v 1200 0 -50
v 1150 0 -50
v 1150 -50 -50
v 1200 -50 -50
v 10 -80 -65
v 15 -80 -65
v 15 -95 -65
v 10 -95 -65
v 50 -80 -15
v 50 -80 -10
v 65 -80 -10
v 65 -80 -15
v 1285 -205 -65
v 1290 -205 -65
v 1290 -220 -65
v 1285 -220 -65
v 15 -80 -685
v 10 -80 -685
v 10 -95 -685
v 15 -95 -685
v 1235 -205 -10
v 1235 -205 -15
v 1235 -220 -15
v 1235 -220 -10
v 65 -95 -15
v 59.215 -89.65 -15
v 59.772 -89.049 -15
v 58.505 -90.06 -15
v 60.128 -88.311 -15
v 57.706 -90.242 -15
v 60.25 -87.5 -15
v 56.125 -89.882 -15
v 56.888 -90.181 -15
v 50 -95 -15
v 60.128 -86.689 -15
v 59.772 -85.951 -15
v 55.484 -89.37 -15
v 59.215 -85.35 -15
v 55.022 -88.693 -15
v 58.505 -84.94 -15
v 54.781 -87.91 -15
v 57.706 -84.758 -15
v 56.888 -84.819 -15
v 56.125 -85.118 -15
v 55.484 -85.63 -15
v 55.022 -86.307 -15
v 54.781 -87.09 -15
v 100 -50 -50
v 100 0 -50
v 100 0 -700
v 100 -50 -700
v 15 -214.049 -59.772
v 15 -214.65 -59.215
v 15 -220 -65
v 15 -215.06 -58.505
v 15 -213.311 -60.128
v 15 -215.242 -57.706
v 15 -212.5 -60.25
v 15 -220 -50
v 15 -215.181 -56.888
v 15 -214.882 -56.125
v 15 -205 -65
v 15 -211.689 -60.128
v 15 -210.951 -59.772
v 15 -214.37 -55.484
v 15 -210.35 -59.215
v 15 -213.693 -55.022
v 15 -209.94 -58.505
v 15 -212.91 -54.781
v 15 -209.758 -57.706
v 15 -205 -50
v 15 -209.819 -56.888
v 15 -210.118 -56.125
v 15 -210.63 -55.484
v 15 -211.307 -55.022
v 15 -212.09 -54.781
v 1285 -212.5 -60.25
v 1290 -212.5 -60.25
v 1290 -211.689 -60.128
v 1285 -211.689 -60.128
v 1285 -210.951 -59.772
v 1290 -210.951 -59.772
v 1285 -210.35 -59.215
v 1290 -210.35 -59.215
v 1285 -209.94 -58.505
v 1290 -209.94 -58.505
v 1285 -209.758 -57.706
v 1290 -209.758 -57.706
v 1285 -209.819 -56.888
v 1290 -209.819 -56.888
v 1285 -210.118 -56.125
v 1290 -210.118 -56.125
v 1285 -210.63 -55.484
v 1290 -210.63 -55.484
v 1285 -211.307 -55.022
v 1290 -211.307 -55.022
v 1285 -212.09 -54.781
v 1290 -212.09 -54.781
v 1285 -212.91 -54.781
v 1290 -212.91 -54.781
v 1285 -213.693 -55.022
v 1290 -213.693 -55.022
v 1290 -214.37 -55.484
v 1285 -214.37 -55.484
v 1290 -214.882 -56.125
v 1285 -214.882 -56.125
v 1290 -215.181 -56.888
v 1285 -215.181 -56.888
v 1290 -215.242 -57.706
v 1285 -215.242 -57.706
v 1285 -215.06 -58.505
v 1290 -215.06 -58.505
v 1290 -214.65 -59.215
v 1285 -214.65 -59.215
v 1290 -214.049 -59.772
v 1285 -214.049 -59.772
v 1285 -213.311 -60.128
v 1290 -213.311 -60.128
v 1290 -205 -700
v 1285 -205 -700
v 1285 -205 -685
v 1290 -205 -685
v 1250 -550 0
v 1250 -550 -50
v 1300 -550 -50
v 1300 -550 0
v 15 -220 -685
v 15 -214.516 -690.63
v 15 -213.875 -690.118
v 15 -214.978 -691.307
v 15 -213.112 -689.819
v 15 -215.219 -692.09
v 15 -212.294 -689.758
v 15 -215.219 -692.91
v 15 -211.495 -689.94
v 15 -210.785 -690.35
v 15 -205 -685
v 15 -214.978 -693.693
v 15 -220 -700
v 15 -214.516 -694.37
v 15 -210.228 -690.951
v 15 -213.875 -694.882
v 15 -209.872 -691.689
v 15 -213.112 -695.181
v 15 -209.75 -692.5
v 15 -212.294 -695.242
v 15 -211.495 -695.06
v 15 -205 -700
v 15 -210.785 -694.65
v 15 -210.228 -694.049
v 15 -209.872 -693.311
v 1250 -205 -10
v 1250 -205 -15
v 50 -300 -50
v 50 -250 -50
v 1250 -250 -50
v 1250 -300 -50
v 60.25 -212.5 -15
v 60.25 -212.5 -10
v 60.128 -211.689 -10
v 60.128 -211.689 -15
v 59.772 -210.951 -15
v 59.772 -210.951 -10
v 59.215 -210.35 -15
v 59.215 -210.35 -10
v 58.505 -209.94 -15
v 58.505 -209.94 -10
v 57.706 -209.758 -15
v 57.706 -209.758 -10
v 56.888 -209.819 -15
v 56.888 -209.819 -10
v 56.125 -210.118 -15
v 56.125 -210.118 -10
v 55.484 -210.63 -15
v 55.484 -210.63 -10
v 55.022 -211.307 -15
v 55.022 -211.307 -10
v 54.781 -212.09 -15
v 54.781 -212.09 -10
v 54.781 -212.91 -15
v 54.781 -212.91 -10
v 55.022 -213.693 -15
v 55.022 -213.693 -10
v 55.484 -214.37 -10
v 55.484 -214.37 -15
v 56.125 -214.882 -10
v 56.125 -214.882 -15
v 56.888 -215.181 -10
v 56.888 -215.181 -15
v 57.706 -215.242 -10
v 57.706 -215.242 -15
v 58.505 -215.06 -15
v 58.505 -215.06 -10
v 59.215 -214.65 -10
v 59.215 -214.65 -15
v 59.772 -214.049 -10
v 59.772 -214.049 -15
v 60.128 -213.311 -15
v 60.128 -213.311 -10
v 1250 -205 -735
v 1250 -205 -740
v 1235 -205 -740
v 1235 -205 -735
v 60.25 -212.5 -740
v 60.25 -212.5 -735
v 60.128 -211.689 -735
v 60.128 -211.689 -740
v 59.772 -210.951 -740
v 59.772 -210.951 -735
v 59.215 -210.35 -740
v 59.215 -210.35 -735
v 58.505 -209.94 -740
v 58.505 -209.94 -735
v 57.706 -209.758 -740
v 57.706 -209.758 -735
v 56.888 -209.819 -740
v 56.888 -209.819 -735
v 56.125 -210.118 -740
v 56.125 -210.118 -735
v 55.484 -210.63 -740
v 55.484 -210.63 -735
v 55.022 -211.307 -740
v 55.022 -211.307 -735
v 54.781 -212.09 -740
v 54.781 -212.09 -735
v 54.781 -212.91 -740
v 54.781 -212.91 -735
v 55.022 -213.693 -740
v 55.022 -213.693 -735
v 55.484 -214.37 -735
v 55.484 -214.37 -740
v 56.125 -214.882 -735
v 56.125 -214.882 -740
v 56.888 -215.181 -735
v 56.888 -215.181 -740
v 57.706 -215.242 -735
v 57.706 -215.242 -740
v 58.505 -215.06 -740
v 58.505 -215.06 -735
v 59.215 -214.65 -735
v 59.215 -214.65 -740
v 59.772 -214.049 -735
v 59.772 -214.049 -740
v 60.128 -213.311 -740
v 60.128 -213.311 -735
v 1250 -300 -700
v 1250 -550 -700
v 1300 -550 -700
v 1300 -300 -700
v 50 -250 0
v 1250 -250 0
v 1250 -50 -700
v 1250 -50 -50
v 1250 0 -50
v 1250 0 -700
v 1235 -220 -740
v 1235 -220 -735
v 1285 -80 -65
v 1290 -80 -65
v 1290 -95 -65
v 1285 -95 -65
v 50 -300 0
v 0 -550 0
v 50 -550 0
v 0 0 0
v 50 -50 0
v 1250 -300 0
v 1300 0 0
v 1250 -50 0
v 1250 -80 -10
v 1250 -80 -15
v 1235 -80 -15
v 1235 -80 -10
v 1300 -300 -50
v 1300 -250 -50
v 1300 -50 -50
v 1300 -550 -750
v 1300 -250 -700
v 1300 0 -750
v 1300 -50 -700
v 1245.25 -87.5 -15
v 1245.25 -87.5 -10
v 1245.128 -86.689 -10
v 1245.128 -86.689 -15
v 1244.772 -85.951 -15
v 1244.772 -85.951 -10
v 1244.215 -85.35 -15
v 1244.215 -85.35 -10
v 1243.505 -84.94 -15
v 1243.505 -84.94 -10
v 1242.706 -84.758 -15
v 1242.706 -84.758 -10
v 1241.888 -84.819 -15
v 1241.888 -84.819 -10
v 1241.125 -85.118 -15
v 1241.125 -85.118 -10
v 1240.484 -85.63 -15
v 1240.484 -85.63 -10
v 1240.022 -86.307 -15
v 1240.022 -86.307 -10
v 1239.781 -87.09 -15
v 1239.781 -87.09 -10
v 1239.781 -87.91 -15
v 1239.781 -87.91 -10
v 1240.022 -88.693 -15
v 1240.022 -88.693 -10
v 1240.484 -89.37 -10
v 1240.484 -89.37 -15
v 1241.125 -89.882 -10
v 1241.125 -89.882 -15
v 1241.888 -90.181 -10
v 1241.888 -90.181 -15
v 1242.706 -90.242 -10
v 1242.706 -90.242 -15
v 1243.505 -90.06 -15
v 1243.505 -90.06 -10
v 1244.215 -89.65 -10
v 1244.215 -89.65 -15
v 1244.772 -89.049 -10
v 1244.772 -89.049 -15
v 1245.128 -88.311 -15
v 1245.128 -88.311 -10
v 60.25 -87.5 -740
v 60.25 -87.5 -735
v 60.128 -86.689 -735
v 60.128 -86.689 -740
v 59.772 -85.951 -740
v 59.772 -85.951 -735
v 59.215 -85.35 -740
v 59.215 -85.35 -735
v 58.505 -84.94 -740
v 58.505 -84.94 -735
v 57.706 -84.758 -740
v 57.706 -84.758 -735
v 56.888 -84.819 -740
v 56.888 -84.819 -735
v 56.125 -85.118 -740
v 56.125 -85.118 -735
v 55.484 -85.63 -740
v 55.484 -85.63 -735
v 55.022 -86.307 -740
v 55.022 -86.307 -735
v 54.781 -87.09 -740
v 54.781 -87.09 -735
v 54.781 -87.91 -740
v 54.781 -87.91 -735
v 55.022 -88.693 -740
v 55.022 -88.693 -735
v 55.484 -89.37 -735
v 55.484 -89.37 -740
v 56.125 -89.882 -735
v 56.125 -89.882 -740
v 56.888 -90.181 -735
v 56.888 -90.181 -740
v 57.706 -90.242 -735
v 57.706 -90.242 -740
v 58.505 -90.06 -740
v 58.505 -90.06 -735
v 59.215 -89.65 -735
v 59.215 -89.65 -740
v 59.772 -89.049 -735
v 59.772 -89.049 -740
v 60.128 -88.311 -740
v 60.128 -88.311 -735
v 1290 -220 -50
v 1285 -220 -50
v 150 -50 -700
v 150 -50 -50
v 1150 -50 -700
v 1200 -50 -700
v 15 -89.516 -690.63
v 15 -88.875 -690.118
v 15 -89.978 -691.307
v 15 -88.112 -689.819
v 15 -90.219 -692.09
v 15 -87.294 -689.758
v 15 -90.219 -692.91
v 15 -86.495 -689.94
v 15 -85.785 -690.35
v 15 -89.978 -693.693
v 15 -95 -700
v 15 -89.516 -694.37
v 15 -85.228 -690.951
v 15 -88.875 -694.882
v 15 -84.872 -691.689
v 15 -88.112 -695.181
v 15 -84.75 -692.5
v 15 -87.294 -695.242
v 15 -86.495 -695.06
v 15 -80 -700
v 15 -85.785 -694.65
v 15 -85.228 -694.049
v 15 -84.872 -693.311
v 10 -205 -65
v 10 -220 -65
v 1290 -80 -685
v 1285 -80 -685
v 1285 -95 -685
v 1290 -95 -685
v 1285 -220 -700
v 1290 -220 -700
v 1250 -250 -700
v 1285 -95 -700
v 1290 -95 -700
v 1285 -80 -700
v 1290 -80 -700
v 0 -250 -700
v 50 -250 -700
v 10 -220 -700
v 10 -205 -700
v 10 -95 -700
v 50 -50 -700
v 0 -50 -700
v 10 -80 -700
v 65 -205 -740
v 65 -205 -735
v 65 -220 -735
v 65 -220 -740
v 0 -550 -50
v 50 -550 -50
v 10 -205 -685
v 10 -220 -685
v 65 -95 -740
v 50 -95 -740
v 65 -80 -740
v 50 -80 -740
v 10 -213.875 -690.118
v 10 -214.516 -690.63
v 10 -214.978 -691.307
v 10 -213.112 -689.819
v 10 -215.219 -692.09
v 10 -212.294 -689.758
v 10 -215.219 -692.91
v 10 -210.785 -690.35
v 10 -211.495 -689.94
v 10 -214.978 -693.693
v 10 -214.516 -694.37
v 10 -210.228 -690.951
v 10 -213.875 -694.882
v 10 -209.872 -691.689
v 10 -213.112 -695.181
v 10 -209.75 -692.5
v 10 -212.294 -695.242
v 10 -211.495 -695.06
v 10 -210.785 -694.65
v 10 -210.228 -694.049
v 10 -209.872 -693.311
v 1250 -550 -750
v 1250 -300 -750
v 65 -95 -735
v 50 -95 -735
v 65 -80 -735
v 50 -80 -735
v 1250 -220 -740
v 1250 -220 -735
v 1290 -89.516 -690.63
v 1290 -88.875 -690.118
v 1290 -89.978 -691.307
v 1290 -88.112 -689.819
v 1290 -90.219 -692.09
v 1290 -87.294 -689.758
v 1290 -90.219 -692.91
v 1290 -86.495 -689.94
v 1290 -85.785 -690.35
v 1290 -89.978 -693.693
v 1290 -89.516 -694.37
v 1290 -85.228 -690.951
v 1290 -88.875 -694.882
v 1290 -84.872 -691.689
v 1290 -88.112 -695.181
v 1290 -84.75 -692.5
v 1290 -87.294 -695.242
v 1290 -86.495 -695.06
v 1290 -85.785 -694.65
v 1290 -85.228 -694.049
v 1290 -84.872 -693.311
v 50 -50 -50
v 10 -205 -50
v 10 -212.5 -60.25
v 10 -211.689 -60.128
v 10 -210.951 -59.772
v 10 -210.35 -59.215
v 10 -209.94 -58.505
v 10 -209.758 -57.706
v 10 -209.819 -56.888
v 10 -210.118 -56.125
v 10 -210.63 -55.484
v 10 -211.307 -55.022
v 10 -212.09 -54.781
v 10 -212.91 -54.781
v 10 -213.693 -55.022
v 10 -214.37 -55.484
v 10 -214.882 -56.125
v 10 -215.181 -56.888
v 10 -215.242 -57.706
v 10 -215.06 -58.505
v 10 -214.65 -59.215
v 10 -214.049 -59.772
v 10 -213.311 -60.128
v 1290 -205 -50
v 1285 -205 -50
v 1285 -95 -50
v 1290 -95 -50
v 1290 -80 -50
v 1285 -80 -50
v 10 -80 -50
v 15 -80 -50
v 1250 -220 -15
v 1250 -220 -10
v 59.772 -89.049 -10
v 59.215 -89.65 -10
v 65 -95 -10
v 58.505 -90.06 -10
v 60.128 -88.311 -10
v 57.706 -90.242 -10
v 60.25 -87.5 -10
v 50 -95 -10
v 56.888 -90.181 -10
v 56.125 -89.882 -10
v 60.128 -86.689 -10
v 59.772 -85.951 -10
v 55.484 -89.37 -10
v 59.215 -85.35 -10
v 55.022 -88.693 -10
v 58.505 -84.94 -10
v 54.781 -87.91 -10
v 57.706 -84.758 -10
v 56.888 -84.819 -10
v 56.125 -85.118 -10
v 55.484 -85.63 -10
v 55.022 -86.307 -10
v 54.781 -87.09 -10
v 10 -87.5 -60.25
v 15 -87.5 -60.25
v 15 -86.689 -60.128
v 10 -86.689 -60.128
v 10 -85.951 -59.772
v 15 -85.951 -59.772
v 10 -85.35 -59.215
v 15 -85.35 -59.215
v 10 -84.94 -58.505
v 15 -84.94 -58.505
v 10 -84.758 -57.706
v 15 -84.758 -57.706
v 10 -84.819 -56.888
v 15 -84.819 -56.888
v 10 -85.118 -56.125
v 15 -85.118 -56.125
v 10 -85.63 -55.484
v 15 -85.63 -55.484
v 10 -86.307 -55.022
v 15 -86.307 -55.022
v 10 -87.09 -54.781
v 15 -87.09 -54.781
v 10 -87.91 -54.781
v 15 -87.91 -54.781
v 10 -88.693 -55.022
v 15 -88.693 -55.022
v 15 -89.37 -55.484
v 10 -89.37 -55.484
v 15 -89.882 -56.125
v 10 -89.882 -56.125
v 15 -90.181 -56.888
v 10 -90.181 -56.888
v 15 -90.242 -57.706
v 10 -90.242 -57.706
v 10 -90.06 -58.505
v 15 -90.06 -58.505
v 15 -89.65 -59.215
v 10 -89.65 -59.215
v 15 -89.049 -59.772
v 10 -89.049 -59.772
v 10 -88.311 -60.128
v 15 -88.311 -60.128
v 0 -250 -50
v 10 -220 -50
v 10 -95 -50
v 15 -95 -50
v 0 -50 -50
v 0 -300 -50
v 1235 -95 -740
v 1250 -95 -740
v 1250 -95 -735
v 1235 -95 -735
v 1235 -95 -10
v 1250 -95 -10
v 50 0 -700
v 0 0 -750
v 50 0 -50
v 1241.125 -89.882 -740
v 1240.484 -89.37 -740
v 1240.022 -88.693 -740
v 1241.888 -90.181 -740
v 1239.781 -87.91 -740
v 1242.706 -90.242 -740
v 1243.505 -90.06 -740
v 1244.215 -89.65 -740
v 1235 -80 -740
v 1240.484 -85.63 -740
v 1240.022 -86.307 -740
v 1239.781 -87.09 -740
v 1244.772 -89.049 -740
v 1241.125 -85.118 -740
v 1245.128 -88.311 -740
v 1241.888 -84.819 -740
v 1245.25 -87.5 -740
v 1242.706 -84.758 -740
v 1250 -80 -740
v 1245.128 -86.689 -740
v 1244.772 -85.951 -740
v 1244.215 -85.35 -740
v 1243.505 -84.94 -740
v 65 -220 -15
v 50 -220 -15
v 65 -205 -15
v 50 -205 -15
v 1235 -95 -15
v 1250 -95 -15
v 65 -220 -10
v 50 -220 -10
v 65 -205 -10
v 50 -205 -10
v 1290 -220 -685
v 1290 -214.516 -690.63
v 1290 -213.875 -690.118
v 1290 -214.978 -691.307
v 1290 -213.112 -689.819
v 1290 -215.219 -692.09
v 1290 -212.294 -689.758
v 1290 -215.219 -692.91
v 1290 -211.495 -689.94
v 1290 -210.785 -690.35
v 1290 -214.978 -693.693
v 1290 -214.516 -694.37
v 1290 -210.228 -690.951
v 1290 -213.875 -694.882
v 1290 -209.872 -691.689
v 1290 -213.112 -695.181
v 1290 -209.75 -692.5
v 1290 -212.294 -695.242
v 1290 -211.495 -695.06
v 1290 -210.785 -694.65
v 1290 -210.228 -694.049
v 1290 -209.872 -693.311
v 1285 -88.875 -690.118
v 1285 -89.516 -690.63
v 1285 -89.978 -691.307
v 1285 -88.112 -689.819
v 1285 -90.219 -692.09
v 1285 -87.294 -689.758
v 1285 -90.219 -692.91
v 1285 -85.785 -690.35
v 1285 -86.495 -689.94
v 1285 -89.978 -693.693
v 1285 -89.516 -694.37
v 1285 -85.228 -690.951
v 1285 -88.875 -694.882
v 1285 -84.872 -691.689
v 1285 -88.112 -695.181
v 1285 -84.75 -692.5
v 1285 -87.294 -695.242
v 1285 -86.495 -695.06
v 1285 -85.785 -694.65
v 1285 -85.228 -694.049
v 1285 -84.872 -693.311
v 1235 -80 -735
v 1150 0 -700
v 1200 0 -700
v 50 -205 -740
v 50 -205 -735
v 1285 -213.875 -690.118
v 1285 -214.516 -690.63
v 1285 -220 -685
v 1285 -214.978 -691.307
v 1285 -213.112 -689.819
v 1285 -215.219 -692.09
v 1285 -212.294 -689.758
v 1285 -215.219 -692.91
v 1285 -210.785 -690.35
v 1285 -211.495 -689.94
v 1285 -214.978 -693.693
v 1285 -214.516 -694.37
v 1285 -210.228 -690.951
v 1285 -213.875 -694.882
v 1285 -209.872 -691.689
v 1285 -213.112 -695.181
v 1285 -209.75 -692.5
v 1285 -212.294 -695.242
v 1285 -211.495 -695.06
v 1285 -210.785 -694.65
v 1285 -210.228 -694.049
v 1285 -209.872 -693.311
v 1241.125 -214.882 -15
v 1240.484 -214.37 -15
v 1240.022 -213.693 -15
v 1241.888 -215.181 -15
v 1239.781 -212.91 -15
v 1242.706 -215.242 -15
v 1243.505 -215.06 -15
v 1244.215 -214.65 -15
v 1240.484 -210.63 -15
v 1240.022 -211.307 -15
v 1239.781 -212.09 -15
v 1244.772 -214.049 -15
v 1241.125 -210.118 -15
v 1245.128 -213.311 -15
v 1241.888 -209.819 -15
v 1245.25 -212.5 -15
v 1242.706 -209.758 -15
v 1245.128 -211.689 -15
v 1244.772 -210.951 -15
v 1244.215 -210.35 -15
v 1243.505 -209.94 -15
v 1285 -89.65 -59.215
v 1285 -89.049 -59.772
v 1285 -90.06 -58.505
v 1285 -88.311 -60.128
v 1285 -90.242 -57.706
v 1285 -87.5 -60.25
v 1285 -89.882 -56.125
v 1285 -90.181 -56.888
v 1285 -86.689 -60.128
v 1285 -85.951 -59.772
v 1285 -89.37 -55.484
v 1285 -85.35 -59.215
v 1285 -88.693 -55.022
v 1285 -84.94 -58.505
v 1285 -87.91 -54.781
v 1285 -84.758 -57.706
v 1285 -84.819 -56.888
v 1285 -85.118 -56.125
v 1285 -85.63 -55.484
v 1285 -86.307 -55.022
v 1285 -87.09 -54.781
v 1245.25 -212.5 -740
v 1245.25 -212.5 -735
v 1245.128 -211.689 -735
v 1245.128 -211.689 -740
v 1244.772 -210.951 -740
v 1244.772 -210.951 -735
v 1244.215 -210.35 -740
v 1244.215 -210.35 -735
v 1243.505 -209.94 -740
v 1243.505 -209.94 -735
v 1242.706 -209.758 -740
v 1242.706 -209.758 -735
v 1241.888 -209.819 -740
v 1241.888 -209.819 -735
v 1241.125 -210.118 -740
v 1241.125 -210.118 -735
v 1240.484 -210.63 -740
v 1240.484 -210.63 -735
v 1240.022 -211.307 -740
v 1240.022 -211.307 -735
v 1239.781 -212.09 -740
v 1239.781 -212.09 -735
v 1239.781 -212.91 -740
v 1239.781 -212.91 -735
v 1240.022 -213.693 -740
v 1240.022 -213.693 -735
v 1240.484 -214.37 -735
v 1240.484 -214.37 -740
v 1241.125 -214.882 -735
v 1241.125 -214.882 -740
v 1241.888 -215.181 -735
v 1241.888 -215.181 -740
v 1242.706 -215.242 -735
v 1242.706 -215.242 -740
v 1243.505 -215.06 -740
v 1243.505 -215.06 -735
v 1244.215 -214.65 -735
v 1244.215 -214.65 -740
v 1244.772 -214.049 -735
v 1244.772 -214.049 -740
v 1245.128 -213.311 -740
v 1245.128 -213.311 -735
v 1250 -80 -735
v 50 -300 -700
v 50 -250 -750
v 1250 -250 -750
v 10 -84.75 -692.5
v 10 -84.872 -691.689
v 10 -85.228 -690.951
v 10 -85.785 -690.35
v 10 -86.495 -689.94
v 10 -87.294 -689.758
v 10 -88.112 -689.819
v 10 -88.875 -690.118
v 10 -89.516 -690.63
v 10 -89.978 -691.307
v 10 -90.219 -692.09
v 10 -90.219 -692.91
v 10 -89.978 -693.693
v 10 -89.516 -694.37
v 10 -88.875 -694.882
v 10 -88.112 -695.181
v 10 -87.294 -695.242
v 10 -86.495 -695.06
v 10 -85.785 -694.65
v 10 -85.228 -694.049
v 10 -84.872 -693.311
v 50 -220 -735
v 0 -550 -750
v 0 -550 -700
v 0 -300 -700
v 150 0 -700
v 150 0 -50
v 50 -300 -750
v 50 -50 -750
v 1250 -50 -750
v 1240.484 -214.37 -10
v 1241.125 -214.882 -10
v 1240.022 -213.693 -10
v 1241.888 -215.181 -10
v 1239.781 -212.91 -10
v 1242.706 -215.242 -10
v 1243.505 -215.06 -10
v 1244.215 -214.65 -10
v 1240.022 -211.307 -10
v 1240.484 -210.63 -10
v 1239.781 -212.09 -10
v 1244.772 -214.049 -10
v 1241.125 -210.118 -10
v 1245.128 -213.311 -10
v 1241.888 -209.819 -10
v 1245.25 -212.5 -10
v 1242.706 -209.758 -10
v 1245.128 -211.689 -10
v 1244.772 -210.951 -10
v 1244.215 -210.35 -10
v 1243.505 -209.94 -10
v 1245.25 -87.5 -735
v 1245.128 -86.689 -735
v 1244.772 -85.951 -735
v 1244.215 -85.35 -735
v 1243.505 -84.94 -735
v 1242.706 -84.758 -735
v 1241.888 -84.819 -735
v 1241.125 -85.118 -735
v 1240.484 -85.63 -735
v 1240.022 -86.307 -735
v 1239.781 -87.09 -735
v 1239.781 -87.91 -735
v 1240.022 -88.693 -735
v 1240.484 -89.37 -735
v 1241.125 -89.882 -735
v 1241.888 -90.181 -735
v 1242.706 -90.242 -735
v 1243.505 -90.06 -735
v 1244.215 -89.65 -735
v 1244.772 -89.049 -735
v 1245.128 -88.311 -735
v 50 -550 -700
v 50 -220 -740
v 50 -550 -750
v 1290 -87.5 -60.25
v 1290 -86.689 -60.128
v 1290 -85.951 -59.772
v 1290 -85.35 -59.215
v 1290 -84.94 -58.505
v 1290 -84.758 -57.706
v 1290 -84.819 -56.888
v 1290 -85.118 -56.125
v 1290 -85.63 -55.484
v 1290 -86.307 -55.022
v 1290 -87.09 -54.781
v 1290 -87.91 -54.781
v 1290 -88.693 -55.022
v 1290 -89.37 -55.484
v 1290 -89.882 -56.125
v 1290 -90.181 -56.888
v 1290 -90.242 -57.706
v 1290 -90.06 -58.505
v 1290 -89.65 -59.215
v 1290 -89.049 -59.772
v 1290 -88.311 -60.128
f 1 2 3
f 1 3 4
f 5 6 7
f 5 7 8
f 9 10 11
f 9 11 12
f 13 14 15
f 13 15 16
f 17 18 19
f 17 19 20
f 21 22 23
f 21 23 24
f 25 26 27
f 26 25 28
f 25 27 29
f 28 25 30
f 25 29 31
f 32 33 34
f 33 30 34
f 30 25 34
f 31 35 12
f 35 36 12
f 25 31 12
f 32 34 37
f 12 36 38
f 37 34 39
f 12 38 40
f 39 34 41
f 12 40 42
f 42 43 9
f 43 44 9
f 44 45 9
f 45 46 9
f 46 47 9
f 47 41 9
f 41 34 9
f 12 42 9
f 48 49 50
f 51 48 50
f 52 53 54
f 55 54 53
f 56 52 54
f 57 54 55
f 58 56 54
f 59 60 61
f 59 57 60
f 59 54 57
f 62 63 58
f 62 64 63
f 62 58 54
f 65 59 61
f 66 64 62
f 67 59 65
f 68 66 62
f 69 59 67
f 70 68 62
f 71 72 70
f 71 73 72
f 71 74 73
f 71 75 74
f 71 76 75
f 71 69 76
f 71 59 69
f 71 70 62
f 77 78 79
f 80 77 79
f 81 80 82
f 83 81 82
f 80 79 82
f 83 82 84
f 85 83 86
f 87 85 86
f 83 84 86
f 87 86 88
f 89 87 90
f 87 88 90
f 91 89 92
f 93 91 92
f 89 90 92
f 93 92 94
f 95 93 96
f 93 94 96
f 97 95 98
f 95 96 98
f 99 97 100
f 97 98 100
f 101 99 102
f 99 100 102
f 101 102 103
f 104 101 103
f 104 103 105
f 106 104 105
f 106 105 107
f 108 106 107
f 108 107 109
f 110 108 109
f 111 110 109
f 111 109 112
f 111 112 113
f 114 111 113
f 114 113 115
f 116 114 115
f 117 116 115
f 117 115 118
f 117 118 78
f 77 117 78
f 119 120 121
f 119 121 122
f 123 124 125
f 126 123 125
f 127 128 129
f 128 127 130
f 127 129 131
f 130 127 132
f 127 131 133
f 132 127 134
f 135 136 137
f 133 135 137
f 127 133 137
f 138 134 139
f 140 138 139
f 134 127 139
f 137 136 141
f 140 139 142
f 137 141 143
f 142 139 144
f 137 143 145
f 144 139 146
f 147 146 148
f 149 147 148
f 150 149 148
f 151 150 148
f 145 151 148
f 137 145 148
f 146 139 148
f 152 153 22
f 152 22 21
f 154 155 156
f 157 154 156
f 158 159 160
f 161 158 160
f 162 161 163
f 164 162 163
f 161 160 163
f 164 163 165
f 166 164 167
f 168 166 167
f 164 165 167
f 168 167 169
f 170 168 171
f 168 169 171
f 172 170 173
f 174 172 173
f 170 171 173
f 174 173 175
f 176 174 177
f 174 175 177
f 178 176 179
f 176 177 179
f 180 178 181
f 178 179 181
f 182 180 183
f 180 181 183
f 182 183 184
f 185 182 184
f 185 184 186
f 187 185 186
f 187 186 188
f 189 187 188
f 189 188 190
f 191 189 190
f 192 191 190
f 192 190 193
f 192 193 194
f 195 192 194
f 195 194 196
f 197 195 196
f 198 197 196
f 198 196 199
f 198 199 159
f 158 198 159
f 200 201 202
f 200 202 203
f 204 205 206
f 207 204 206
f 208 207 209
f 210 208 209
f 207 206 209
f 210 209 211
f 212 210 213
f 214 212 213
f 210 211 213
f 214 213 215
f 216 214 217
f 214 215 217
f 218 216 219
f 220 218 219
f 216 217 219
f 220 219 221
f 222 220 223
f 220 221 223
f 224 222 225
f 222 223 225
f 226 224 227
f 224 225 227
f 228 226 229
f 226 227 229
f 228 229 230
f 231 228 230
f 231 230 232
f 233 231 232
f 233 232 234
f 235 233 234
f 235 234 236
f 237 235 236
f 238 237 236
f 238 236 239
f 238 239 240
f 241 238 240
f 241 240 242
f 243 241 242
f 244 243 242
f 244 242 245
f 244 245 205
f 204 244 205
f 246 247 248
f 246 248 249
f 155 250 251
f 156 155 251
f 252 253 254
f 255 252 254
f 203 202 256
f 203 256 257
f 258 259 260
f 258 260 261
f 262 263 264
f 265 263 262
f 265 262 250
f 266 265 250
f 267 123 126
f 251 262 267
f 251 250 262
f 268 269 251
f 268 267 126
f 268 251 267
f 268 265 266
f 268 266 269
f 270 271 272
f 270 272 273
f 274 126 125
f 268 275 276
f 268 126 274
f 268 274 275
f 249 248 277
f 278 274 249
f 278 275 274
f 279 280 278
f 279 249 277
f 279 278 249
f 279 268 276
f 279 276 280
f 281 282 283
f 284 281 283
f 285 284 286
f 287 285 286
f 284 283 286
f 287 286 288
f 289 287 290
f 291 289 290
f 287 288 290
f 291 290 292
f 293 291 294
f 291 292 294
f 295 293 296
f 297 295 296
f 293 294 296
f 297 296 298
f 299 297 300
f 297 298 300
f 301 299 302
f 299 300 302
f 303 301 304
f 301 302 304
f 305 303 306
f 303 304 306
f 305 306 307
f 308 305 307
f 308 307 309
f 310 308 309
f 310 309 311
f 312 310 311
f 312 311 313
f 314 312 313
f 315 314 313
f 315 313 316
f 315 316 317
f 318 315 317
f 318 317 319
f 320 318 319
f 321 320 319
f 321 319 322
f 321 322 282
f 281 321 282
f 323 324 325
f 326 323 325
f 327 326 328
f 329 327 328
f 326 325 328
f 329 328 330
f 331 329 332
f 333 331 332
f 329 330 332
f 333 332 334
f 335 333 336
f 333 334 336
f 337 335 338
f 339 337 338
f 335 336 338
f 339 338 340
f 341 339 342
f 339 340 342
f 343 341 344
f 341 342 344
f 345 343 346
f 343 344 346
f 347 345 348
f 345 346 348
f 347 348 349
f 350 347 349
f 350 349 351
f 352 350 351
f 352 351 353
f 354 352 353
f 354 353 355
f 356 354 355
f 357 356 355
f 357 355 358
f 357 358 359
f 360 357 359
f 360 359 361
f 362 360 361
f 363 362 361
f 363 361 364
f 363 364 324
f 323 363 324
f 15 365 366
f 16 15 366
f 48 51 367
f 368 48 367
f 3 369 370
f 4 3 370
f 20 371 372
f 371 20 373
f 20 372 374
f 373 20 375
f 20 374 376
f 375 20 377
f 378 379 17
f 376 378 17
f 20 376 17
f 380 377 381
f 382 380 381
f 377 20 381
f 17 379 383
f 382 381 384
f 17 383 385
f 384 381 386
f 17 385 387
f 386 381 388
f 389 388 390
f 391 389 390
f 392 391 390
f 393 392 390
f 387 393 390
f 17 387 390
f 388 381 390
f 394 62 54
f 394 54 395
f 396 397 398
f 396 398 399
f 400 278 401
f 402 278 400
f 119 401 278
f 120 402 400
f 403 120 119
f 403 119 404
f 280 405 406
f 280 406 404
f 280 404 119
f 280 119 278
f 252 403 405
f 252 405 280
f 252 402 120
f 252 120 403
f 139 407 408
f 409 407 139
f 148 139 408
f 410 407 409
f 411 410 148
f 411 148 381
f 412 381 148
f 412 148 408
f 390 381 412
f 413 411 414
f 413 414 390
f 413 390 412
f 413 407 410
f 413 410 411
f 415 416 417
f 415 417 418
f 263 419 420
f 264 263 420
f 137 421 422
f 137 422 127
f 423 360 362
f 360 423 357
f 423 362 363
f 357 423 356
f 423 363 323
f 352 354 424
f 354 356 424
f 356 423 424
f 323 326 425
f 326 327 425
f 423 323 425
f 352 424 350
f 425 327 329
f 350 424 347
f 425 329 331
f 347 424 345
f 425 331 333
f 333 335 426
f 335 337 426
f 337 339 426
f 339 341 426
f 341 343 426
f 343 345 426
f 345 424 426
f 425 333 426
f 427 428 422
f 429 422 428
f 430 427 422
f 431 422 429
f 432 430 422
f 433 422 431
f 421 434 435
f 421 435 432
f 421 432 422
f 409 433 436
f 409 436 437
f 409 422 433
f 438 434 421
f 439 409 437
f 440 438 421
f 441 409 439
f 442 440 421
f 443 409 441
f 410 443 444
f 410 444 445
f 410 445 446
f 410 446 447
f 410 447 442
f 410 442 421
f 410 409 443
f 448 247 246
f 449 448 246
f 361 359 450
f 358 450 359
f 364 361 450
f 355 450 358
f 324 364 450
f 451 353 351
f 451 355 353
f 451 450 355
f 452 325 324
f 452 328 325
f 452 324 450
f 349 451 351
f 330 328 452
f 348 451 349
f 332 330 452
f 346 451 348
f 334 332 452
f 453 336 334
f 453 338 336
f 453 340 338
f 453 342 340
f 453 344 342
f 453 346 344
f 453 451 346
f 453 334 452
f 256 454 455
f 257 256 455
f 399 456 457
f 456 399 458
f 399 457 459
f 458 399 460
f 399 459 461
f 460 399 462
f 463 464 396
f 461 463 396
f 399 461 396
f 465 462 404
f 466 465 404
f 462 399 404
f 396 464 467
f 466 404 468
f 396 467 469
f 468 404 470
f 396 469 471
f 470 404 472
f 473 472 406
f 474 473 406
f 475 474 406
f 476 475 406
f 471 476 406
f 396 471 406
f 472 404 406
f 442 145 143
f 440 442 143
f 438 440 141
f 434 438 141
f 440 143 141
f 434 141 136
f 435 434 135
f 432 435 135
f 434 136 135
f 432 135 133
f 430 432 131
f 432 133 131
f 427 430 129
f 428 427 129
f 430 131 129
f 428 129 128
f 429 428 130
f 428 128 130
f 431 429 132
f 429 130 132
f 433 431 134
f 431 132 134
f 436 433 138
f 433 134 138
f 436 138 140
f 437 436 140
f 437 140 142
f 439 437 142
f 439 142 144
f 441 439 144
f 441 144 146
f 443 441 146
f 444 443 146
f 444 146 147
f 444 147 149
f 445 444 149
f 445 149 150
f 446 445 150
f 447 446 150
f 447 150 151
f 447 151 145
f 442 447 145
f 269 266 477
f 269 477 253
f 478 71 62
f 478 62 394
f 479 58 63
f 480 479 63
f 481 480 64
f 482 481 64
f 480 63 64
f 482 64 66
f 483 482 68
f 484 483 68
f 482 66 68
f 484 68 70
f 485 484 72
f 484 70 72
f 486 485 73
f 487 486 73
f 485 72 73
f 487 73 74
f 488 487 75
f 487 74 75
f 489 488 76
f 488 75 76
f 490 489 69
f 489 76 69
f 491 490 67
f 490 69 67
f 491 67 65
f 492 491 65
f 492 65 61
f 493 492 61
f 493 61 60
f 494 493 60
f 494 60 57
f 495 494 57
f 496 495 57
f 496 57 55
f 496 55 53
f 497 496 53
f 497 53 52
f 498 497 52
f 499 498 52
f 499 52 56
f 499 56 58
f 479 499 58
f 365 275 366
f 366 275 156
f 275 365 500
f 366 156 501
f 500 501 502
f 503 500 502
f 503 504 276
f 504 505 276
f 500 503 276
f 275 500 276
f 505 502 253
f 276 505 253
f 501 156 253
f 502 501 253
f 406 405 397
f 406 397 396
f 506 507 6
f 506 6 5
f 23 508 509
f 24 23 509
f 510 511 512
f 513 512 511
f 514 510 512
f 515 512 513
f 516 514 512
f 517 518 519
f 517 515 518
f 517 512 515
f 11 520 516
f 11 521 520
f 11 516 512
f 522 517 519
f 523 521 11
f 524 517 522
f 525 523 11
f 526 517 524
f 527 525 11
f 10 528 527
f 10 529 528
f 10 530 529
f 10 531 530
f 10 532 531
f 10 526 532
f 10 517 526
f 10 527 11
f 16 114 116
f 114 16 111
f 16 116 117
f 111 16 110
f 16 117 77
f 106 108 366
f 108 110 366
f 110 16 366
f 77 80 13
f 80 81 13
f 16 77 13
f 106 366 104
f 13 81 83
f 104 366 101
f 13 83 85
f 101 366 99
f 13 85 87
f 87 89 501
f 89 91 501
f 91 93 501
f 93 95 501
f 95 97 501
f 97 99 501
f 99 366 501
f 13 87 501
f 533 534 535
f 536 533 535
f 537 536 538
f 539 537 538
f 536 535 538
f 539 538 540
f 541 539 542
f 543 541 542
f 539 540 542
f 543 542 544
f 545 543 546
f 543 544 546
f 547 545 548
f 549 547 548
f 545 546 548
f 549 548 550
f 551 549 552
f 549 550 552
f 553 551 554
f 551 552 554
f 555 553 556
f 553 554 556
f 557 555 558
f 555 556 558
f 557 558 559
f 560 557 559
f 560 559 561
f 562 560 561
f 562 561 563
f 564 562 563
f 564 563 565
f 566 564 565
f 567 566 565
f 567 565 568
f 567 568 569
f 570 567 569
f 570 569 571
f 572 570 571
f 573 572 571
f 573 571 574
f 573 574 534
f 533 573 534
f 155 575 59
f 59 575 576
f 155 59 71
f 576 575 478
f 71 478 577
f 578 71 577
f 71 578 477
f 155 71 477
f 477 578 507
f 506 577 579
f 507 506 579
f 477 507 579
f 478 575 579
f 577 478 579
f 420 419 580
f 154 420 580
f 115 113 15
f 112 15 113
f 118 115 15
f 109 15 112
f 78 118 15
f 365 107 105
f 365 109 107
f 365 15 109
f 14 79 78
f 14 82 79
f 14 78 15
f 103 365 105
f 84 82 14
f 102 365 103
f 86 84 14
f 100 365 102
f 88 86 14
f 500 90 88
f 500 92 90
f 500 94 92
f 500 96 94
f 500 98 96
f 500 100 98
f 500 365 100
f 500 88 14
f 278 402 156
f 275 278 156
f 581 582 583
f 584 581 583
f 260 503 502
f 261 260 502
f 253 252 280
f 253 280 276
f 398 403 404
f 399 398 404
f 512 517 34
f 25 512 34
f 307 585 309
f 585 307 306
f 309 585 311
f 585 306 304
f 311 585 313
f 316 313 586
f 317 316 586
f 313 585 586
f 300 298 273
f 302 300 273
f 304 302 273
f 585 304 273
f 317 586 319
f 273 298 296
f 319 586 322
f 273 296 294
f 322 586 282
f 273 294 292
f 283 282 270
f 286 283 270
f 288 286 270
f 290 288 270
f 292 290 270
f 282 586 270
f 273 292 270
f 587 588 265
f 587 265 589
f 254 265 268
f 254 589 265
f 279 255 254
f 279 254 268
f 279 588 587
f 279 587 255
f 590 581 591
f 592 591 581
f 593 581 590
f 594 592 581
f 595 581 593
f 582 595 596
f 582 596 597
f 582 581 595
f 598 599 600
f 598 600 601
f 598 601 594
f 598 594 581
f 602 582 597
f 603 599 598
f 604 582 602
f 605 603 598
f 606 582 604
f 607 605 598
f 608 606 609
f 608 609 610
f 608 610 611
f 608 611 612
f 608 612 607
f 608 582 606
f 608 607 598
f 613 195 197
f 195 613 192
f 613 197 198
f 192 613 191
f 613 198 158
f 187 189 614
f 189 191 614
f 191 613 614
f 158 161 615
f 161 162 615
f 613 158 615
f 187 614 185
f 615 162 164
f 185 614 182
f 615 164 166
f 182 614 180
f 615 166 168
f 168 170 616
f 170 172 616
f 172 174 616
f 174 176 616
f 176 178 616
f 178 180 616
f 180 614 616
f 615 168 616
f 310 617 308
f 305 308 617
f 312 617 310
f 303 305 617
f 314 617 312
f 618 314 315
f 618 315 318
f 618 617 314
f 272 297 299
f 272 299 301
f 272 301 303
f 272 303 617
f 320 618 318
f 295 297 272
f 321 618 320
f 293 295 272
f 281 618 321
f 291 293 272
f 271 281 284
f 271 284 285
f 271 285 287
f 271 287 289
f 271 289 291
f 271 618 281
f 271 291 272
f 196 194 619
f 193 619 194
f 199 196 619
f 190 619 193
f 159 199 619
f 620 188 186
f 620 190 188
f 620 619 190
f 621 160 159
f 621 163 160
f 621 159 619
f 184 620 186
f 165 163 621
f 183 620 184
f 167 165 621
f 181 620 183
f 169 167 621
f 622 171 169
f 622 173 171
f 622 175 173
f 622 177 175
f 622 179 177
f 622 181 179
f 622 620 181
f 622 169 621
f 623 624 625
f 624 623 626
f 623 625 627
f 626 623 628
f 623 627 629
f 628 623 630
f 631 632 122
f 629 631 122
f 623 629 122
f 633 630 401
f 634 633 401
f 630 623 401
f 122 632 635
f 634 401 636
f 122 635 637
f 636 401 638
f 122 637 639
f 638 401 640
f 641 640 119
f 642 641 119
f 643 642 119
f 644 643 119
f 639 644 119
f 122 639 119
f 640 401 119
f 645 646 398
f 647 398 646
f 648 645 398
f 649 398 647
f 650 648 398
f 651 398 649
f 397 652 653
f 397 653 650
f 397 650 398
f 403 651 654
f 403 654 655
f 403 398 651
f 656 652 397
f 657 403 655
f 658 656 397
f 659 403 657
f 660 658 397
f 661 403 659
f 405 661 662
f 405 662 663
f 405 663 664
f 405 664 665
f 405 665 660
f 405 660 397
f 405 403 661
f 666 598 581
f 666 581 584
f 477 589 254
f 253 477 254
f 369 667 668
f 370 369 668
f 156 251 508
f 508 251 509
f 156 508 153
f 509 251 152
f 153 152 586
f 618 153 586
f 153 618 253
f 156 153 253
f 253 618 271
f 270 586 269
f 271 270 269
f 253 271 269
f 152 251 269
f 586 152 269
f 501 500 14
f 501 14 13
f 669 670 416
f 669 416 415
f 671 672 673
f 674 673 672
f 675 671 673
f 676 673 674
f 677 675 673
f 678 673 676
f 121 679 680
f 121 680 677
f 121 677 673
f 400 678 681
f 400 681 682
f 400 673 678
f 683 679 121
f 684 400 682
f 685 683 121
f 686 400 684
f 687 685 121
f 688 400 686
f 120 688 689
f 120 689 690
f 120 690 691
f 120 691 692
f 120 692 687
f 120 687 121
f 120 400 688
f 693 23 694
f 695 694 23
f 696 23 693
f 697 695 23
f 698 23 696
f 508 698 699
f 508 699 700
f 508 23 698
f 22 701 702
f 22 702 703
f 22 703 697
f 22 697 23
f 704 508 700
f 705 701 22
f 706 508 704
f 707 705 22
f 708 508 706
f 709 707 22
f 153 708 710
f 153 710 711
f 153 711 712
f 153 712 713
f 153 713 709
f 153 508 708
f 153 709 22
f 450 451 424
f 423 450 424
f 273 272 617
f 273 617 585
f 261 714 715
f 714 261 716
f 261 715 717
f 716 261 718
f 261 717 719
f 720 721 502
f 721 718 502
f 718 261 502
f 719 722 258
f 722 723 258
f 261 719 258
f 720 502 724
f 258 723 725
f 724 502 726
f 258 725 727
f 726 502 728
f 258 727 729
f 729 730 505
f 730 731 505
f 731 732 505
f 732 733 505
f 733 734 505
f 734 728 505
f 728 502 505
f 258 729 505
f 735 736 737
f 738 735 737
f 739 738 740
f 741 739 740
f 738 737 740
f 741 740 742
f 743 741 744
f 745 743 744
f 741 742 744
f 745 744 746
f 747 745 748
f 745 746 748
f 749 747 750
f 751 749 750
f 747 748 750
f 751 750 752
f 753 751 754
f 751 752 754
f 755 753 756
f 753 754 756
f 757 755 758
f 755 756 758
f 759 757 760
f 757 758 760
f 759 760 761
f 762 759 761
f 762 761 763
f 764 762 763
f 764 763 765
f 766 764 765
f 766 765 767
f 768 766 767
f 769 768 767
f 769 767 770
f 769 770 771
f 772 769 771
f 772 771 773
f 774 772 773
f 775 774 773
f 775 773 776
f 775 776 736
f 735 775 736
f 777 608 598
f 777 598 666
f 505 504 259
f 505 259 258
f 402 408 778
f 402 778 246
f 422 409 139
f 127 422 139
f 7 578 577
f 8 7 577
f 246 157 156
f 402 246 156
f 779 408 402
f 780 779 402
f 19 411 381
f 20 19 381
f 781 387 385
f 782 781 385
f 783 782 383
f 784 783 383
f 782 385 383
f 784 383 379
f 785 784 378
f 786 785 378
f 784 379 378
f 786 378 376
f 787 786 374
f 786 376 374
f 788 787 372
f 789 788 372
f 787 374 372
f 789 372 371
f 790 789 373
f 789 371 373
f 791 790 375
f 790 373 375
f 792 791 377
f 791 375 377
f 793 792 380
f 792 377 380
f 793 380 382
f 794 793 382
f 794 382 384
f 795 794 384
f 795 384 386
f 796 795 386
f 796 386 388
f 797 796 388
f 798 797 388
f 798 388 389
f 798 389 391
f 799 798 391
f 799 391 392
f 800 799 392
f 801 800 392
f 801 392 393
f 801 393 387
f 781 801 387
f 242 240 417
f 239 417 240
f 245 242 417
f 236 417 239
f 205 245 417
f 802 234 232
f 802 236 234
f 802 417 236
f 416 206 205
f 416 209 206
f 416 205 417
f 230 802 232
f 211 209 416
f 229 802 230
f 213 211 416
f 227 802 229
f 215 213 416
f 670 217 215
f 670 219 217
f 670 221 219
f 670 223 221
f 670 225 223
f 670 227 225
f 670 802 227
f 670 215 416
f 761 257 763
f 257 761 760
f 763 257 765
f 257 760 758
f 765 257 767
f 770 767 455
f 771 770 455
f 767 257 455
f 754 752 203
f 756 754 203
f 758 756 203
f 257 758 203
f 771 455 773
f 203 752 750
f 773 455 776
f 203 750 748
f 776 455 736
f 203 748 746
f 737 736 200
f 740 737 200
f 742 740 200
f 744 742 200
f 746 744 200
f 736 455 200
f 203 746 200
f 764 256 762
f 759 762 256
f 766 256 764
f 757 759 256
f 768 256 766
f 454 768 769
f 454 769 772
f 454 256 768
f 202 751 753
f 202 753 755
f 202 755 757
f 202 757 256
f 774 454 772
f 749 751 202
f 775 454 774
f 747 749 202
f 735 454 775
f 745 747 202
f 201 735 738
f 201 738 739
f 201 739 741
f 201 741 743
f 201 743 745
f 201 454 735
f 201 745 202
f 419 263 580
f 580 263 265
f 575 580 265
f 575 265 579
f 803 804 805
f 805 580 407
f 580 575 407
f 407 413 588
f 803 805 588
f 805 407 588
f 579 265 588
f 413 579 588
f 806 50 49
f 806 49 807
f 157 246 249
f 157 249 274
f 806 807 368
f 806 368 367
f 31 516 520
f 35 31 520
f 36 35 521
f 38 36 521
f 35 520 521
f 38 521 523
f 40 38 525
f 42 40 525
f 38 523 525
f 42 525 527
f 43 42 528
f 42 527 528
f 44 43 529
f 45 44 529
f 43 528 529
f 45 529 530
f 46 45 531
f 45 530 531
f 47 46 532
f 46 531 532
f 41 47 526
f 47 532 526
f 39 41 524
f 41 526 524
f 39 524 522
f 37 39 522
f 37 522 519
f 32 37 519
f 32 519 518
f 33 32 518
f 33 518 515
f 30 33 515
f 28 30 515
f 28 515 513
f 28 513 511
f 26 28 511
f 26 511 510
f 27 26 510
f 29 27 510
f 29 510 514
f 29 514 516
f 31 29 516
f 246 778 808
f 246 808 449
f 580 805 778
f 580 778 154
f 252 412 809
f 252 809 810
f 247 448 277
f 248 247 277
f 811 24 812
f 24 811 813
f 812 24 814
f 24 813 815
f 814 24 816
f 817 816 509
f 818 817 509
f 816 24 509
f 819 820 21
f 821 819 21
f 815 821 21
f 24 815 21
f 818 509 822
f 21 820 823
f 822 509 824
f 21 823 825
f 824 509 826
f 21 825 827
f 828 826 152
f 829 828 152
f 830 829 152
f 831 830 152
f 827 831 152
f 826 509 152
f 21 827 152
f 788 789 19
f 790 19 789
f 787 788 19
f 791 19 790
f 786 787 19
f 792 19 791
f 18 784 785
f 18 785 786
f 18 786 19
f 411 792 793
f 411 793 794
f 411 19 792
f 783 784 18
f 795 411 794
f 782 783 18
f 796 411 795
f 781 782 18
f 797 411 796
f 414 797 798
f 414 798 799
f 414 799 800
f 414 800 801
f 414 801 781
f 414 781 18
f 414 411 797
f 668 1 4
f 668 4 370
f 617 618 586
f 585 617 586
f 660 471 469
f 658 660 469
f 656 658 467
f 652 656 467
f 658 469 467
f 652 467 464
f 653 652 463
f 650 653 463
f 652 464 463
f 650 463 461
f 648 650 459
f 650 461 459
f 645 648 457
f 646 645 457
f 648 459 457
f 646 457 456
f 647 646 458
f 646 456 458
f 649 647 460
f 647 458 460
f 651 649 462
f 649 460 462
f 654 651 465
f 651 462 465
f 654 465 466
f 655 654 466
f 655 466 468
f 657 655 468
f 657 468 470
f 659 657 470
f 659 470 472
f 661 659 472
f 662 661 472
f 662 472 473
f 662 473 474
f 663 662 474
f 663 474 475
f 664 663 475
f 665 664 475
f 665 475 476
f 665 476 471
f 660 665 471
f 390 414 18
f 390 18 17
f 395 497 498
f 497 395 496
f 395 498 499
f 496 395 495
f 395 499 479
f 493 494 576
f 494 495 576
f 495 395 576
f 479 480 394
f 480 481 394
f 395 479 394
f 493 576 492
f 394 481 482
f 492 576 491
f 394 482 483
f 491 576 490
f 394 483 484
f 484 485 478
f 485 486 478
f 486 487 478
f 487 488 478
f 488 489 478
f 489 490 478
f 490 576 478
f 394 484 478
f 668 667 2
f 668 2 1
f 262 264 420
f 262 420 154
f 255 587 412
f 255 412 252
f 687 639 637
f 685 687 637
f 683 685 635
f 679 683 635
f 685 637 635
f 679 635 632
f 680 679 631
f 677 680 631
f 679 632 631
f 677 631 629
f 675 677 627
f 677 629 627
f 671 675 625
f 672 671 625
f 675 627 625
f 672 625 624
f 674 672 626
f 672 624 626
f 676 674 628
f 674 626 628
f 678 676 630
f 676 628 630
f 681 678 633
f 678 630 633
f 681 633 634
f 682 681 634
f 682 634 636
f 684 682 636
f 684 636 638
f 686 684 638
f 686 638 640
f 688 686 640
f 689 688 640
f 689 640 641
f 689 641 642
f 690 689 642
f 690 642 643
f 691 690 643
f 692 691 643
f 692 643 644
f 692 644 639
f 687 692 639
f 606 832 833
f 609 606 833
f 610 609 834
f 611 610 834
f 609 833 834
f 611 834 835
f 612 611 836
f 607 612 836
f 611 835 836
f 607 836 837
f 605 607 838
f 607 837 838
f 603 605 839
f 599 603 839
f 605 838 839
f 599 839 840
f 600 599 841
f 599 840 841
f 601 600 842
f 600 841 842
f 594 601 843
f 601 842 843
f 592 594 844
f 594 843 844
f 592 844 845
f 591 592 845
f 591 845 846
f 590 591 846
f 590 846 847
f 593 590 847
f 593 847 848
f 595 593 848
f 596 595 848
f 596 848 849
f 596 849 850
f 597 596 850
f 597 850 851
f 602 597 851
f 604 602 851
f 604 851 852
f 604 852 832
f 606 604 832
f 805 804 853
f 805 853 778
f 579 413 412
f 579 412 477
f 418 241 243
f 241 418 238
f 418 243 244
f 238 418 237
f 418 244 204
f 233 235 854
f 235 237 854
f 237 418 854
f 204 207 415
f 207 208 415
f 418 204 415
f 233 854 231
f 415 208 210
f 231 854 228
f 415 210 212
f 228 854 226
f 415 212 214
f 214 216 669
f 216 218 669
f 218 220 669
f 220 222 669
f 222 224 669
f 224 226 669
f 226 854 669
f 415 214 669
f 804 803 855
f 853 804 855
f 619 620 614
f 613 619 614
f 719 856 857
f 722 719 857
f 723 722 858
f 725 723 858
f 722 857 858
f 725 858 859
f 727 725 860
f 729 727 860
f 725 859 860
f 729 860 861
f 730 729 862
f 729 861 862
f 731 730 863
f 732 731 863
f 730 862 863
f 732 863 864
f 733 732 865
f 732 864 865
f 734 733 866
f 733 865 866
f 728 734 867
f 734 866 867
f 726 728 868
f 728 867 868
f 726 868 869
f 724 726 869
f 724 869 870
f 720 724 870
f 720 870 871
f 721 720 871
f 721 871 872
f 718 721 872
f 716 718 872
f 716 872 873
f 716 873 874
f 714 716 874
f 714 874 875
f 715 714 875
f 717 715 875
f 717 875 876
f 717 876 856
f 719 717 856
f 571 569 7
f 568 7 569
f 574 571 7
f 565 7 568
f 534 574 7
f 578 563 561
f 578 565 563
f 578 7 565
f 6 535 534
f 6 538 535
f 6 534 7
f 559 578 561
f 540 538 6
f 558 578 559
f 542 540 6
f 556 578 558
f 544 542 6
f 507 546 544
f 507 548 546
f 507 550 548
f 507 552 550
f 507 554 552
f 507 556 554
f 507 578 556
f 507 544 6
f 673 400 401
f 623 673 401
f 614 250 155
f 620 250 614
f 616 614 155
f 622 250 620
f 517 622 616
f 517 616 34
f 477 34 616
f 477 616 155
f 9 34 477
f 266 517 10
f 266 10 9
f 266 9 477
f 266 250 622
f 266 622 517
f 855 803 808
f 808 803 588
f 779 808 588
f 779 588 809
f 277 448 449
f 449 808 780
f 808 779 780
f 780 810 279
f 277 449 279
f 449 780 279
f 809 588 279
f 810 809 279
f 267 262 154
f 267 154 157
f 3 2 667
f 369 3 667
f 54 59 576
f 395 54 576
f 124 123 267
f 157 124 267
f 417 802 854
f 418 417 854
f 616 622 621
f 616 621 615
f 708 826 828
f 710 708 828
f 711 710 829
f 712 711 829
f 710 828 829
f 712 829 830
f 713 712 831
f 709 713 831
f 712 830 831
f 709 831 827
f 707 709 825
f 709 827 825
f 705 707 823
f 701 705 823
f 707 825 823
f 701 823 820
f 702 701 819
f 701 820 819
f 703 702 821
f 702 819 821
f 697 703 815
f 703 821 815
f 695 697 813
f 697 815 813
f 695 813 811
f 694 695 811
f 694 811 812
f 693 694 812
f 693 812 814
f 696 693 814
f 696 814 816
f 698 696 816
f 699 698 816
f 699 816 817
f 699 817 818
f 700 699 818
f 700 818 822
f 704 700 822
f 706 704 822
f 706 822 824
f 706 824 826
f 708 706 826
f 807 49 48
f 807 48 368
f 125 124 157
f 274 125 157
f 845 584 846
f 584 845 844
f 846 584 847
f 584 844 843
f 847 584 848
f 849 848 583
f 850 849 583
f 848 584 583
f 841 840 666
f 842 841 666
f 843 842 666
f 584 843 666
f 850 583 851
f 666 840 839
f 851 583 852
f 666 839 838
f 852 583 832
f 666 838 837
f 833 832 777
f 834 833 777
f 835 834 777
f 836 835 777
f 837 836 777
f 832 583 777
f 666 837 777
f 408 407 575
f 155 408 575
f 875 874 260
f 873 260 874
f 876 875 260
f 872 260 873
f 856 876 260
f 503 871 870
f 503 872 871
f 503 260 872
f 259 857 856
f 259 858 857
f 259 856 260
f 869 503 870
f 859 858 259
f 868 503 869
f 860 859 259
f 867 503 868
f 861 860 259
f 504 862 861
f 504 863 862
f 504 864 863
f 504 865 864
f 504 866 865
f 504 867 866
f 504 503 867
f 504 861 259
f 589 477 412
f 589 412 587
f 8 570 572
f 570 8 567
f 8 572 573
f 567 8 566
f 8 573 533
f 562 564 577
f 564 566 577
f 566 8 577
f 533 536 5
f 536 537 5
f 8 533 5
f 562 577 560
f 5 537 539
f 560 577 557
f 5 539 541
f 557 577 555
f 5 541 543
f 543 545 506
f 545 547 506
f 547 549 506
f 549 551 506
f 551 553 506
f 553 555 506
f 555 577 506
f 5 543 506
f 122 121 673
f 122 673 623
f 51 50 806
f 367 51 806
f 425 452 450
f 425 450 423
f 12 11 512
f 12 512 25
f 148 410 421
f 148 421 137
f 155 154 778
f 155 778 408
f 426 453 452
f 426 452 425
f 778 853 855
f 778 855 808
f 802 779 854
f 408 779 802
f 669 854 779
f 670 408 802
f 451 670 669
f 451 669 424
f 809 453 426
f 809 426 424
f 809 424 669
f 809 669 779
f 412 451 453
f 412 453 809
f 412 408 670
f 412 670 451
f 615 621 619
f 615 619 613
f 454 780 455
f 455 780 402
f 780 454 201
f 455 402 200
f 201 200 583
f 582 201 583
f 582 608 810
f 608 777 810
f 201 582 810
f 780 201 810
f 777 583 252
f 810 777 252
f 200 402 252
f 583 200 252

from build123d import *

# Parameters (mm, degrees)
ESQUISSE1_W             = 1300
ESQUISSE1_H             = 750
ESQUISSE1_W_2           = 1200
ESQUISSE1_H_2           = 650
BOSS_EXTRU_1_DEPTH      = 550
ESQUISSE2_W             = 1200
ESQUISSE2_H             = 200
ESQUISSE2_H_2           = 250
ENL_V_MAT_EXTRU_1_DEPTH = 1599.436736315
ESQUISSE3_W             = 650
ESQUISSE3_H             = 200
ESQUISSE3_H_2           = 250
ENL_V_MAT_EXTRU_2_DEPTH = 1599.436736315
ESQUISSE4_W             = 50
ESQUISSE4_H             = 650
BOSS_EXTRU_2_DEPTH      = 50
BOSS_EXTRU_2_2_DEPTH    = 50
ESQUISSE5_W             = 5
ESQUISSE5_H             = 15
BOSS_EXTRU_3_DEPTH      = 15
ESQUISSE6_W             = 5
ESQUISSE6_H             = 15
BOSS_EXTRU_4_DEPTH      = 15
ESQUISSE7_W             = 5
ESQUISSE7_H             = 15
BOSS_EXTRU_5_DEPTH      = 15
ESQUISSE8_W             = 5
ESQUISSE8_H             = 15
BOSS_EXTRU_6_DEPTH      = 15
ESQUISSE10_W            = 5
ESQUISSE10_H            = 15
BOSS_EXTRU_7_DEPTH      = 15
ESQUISSE12_W            = 5
ESQUISSE12_H            = 15
BOSS_EXTRU_8_DEPTH      = 15
ESQUISSE14_W            = 5
ESQUISSE14_H            = 15
BOSS_EXTRU_9_DEPTH      = 15
ESQUISSE15_W            = 5
ESQUISSE15_H            = 15
BOSS_EXTRU_10_DEPTH     = 15
ESQUISSE16_R            = 2.75
ENL_V_MAT_EXTRU_3_DEPTH = 1500
ESQUISSE17_R            = 2.75
ENL_V_MAT_EXTRU_4_DEPTH = 1000


with BuildPart() as part:
    # Esquisse1 → Boss.-Extru.1 (new body)
    with BuildSketch(Plane(origin=(0, 0, 0), x_dir=(1, 0, 0), z_dir=(0, 1, 0))):
        with Locations((650, 375)):
            Rectangle(ESQUISSE1_W, ESQUISSE1_H)
        with Locations((650, 375)):
            Rectangle(ESQUISSE1_W_2, ESQUISSE1_H_2, mode=Mode.SUBTRACT)
    extrude(amount=-BOSS_EXTRU_1_DEPTH)

    # Esquisse2 → Enlèv. mat.-Extru.1 (cut, through all)
    with BuildSketch(Plane.XY):
        with Locations((650, -150)):
            Rectangle(ESQUISSE2_W, ESQUISSE2_H)
        with Locations((650, -425)):
            Rectangle(ESQUISSE2_W, ESQUISSE2_H_2)
    extrude(amount=-ENL_V_MAT_EXTRU_1_DEPTH, mode=Mode.SUBTRACT)

    # Esquisse3 → Enlèv. mat.-Extru.2 (cut, through all)
    with BuildSketch(Plane.ZY):
        with Locations((-375, -150)):
            Rectangle(ESQUISSE3_W, ESQUISSE3_H)
        with Locations((-375, -425)):
            Rectangle(ESQUISSE3_W, ESQUISSE3_H_2)
    extrude(amount=-ENL_V_MAT_EXTRU_2_DEPTH, mode=Mode.SUBTRACT)

    # Esquisse5 → Boss.-Extru.3 (add)
    with BuildSketch(Plane.ZY.offset(-1250)):
        with Locations((-737.5, -87.5)):
            Rectangle(ESQUISSE5_W, ESQUISSE5_H)
        with Locations((-737.5, -212.5)):
            Rectangle(ESQUISSE5_W, ESQUISSE5_H)
    extrude(amount=BOSS_EXTRU_3_DEPTH)

    # Esquisse6 → Boss.-Extru.4 (add)
    with BuildSketch(Plane.XY.offset(-700)):
        with Locations((1287.5, -87.5)):
            Rectangle(ESQUISSE6_W, ESQUISSE6_H)
        with Locations((1287.5, -212.5)):
            Rectangle(ESQUISSE6_W, ESQUISSE6_H)
    extrude(amount=BOSS_EXTRU_4_DEPTH)

    # Esquisse7 → Boss.-Extru.5 (add)
    with BuildSketch(Plane(origin=(50, 0, 0), x_dir=(0, 0, -1), z_dir=(1, 0, 0))):
        with Locations((737.5, -87.5)):
            Rectangle(ESQUISSE7_W, ESQUISSE7_H)
        with Locations((737.5, -212.5)):
            Rectangle(ESQUISSE7_W, ESQUISSE7_H)
    extrude(amount=BOSS_EXTRU_5_DEPTH)

    # Esquisse8 → Boss.-Extru.6 (add)
    with BuildSketch(Plane.XY.offset(-700)):
        with Locations((12.5, -87.5)):
            Rectangle(ESQUISSE8_W, ESQUISSE8_H)
        with Locations((12.5, -212.5)):
            Rectangle(ESQUISSE8_W, ESQUISSE8_H)
    extrude(amount=BOSS_EXTRU_6_DEPTH)

    # Esquisse10 → Boss.-Extru.7 (add)
    with BuildSketch(Plane(origin=(50, 0, 0), x_dir=(0, 0, -1), z_dir=(1, 0, 0))):
        with Locations((12.5, -87.5)):
            Rectangle(ESQUISSE10_W, ESQUISSE10_H)
        with Locations((12.5, -212.5)):
            Rectangle(ESQUISSE10_W, ESQUISSE10_H)
    extrude(amount=BOSS_EXTRU_7_DEPTH)

    # Esquisse12 → Boss.-Extru.8 (add)
    with BuildSketch(Plane(origin=(0, 0, -50), x_dir=(-1, 0, 0), z_dir=(0, 0, -1))):
        with Locations((-12.5, -87.5)):
            Rectangle(ESQUISSE12_W, ESQUISSE12_H)
        with Locations((-12.5, -212.5)):
            Rectangle(ESQUISSE12_W, ESQUISSE12_H)
    extrude(amount=BOSS_EXTRU_8_DEPTH)

    # Esquisse14 → Boss.-Extru.9 (add)
    with BuildSketch(Plane.ZY.offset(-1250)):
        with Locations((-12.5, -87.5)):
            Rectangle(ESQUISSE14_W, ESQUISSE14_H)
        with Locations((-12.5, -212.5)):
            Rectangle(ESQUISSE14_W, ESQUISSE14_H)
    extrude(amount=BOSS_EXTRU_9_DEPTH)

    # Esquisse15 → Boss.-Extru.10 (add)
    with BuildSketch(Plane(origin=(0, 0, -50), x_dir=(-1, 0, 0), z_dir=(0, 0, -1))):
        with Locations((-1287.5, -212.5)):
            Rectangle(ESQUISSE15_W, ESQUISSE15_H)
        with Locations((-1287.5, -87.5)):
            Rectangle(ESQUISSE15_W, ESQUISSE15_H)
    extrude(amount=BOSS_EXTRU_10_DEPTH)

    # Esquisse16 → Enlèv. mat.-Extru.3 (cut)
    with BuildSketch(Plane(origin=(1290, 0, 0), x_dir=(0, 0, -1), z_dir=(1, 0, 0))):
        with Locations((57.5, -87.5)):
            Circle(ESQUISSE16_R)
        with Locations((57.5, -212.5)):
            Circle(ESQUISSE16_R)
        with Locations(Location((692.5, -87.5, 0), (0, 0, 90))):
            Circle(ESQUISSE16_R)
        with Locations(Location((692.5, -212.5, 0), (0, 0, 90))):
            Circle(ESQUISSE16_R)
    extrude(amount=-ENL_V_MAT_EXTRU_3_DEPTH, mode=Mode.SUBTRACT)

    # Esquisse17 → Enlèv. mat.-Extru.4 (cut)
    with BuildSketch(Plane.XY.offset(-10)):
        with Locations((57.5, -87.5)):
            Circle(ESQUISSE17_R)
        with Locations((57.5, -212.5)):
            Circle(ESQUISSE17_R)
        with Locations((1242.5, -212.5)):
            Circle(ESQUISSE17_R)
        with Locations((1242.5, -87.5)):
            Circle(ESQUISSE17_R)
    extrude(amount=-ENL_V_MAT_EXTRU_4_DEPTH, mode=Mode.SUBTRACT)


with BuildPart() as body_2:
    # Esquisse4 → Boss.-Extru.2 (new body)
    with BuildSketch(Plane(origin=(0, 0, 0), x_dir=(1, 0, 0), z_dir=(0, 1, 0))):
        with Locations((125, 375)):
            Rectangle(ESQUISSE4_W, ESQUISSE4_H)
    extrude(amount=-BOSS_EXTRU_2_DEPTH)


with BuildPart() as body_3:
    # Esquisse4 → Boss.-Extru.2 2 (new body)
    with BuildSketch(Plane(origin=(0, 0, 0), x_dir=(1, 0, 0), z_dir=(0, 1, 0))):
        with Locations((1175, 375)):
            Rectangle(ESQUISSE4_W, ESQUISSE4_H)
    extrude(amount=-BOSS_EXTRU_2_2_DEPTH)


solid = Compound([part.part, body_2.part, body_3.part])
